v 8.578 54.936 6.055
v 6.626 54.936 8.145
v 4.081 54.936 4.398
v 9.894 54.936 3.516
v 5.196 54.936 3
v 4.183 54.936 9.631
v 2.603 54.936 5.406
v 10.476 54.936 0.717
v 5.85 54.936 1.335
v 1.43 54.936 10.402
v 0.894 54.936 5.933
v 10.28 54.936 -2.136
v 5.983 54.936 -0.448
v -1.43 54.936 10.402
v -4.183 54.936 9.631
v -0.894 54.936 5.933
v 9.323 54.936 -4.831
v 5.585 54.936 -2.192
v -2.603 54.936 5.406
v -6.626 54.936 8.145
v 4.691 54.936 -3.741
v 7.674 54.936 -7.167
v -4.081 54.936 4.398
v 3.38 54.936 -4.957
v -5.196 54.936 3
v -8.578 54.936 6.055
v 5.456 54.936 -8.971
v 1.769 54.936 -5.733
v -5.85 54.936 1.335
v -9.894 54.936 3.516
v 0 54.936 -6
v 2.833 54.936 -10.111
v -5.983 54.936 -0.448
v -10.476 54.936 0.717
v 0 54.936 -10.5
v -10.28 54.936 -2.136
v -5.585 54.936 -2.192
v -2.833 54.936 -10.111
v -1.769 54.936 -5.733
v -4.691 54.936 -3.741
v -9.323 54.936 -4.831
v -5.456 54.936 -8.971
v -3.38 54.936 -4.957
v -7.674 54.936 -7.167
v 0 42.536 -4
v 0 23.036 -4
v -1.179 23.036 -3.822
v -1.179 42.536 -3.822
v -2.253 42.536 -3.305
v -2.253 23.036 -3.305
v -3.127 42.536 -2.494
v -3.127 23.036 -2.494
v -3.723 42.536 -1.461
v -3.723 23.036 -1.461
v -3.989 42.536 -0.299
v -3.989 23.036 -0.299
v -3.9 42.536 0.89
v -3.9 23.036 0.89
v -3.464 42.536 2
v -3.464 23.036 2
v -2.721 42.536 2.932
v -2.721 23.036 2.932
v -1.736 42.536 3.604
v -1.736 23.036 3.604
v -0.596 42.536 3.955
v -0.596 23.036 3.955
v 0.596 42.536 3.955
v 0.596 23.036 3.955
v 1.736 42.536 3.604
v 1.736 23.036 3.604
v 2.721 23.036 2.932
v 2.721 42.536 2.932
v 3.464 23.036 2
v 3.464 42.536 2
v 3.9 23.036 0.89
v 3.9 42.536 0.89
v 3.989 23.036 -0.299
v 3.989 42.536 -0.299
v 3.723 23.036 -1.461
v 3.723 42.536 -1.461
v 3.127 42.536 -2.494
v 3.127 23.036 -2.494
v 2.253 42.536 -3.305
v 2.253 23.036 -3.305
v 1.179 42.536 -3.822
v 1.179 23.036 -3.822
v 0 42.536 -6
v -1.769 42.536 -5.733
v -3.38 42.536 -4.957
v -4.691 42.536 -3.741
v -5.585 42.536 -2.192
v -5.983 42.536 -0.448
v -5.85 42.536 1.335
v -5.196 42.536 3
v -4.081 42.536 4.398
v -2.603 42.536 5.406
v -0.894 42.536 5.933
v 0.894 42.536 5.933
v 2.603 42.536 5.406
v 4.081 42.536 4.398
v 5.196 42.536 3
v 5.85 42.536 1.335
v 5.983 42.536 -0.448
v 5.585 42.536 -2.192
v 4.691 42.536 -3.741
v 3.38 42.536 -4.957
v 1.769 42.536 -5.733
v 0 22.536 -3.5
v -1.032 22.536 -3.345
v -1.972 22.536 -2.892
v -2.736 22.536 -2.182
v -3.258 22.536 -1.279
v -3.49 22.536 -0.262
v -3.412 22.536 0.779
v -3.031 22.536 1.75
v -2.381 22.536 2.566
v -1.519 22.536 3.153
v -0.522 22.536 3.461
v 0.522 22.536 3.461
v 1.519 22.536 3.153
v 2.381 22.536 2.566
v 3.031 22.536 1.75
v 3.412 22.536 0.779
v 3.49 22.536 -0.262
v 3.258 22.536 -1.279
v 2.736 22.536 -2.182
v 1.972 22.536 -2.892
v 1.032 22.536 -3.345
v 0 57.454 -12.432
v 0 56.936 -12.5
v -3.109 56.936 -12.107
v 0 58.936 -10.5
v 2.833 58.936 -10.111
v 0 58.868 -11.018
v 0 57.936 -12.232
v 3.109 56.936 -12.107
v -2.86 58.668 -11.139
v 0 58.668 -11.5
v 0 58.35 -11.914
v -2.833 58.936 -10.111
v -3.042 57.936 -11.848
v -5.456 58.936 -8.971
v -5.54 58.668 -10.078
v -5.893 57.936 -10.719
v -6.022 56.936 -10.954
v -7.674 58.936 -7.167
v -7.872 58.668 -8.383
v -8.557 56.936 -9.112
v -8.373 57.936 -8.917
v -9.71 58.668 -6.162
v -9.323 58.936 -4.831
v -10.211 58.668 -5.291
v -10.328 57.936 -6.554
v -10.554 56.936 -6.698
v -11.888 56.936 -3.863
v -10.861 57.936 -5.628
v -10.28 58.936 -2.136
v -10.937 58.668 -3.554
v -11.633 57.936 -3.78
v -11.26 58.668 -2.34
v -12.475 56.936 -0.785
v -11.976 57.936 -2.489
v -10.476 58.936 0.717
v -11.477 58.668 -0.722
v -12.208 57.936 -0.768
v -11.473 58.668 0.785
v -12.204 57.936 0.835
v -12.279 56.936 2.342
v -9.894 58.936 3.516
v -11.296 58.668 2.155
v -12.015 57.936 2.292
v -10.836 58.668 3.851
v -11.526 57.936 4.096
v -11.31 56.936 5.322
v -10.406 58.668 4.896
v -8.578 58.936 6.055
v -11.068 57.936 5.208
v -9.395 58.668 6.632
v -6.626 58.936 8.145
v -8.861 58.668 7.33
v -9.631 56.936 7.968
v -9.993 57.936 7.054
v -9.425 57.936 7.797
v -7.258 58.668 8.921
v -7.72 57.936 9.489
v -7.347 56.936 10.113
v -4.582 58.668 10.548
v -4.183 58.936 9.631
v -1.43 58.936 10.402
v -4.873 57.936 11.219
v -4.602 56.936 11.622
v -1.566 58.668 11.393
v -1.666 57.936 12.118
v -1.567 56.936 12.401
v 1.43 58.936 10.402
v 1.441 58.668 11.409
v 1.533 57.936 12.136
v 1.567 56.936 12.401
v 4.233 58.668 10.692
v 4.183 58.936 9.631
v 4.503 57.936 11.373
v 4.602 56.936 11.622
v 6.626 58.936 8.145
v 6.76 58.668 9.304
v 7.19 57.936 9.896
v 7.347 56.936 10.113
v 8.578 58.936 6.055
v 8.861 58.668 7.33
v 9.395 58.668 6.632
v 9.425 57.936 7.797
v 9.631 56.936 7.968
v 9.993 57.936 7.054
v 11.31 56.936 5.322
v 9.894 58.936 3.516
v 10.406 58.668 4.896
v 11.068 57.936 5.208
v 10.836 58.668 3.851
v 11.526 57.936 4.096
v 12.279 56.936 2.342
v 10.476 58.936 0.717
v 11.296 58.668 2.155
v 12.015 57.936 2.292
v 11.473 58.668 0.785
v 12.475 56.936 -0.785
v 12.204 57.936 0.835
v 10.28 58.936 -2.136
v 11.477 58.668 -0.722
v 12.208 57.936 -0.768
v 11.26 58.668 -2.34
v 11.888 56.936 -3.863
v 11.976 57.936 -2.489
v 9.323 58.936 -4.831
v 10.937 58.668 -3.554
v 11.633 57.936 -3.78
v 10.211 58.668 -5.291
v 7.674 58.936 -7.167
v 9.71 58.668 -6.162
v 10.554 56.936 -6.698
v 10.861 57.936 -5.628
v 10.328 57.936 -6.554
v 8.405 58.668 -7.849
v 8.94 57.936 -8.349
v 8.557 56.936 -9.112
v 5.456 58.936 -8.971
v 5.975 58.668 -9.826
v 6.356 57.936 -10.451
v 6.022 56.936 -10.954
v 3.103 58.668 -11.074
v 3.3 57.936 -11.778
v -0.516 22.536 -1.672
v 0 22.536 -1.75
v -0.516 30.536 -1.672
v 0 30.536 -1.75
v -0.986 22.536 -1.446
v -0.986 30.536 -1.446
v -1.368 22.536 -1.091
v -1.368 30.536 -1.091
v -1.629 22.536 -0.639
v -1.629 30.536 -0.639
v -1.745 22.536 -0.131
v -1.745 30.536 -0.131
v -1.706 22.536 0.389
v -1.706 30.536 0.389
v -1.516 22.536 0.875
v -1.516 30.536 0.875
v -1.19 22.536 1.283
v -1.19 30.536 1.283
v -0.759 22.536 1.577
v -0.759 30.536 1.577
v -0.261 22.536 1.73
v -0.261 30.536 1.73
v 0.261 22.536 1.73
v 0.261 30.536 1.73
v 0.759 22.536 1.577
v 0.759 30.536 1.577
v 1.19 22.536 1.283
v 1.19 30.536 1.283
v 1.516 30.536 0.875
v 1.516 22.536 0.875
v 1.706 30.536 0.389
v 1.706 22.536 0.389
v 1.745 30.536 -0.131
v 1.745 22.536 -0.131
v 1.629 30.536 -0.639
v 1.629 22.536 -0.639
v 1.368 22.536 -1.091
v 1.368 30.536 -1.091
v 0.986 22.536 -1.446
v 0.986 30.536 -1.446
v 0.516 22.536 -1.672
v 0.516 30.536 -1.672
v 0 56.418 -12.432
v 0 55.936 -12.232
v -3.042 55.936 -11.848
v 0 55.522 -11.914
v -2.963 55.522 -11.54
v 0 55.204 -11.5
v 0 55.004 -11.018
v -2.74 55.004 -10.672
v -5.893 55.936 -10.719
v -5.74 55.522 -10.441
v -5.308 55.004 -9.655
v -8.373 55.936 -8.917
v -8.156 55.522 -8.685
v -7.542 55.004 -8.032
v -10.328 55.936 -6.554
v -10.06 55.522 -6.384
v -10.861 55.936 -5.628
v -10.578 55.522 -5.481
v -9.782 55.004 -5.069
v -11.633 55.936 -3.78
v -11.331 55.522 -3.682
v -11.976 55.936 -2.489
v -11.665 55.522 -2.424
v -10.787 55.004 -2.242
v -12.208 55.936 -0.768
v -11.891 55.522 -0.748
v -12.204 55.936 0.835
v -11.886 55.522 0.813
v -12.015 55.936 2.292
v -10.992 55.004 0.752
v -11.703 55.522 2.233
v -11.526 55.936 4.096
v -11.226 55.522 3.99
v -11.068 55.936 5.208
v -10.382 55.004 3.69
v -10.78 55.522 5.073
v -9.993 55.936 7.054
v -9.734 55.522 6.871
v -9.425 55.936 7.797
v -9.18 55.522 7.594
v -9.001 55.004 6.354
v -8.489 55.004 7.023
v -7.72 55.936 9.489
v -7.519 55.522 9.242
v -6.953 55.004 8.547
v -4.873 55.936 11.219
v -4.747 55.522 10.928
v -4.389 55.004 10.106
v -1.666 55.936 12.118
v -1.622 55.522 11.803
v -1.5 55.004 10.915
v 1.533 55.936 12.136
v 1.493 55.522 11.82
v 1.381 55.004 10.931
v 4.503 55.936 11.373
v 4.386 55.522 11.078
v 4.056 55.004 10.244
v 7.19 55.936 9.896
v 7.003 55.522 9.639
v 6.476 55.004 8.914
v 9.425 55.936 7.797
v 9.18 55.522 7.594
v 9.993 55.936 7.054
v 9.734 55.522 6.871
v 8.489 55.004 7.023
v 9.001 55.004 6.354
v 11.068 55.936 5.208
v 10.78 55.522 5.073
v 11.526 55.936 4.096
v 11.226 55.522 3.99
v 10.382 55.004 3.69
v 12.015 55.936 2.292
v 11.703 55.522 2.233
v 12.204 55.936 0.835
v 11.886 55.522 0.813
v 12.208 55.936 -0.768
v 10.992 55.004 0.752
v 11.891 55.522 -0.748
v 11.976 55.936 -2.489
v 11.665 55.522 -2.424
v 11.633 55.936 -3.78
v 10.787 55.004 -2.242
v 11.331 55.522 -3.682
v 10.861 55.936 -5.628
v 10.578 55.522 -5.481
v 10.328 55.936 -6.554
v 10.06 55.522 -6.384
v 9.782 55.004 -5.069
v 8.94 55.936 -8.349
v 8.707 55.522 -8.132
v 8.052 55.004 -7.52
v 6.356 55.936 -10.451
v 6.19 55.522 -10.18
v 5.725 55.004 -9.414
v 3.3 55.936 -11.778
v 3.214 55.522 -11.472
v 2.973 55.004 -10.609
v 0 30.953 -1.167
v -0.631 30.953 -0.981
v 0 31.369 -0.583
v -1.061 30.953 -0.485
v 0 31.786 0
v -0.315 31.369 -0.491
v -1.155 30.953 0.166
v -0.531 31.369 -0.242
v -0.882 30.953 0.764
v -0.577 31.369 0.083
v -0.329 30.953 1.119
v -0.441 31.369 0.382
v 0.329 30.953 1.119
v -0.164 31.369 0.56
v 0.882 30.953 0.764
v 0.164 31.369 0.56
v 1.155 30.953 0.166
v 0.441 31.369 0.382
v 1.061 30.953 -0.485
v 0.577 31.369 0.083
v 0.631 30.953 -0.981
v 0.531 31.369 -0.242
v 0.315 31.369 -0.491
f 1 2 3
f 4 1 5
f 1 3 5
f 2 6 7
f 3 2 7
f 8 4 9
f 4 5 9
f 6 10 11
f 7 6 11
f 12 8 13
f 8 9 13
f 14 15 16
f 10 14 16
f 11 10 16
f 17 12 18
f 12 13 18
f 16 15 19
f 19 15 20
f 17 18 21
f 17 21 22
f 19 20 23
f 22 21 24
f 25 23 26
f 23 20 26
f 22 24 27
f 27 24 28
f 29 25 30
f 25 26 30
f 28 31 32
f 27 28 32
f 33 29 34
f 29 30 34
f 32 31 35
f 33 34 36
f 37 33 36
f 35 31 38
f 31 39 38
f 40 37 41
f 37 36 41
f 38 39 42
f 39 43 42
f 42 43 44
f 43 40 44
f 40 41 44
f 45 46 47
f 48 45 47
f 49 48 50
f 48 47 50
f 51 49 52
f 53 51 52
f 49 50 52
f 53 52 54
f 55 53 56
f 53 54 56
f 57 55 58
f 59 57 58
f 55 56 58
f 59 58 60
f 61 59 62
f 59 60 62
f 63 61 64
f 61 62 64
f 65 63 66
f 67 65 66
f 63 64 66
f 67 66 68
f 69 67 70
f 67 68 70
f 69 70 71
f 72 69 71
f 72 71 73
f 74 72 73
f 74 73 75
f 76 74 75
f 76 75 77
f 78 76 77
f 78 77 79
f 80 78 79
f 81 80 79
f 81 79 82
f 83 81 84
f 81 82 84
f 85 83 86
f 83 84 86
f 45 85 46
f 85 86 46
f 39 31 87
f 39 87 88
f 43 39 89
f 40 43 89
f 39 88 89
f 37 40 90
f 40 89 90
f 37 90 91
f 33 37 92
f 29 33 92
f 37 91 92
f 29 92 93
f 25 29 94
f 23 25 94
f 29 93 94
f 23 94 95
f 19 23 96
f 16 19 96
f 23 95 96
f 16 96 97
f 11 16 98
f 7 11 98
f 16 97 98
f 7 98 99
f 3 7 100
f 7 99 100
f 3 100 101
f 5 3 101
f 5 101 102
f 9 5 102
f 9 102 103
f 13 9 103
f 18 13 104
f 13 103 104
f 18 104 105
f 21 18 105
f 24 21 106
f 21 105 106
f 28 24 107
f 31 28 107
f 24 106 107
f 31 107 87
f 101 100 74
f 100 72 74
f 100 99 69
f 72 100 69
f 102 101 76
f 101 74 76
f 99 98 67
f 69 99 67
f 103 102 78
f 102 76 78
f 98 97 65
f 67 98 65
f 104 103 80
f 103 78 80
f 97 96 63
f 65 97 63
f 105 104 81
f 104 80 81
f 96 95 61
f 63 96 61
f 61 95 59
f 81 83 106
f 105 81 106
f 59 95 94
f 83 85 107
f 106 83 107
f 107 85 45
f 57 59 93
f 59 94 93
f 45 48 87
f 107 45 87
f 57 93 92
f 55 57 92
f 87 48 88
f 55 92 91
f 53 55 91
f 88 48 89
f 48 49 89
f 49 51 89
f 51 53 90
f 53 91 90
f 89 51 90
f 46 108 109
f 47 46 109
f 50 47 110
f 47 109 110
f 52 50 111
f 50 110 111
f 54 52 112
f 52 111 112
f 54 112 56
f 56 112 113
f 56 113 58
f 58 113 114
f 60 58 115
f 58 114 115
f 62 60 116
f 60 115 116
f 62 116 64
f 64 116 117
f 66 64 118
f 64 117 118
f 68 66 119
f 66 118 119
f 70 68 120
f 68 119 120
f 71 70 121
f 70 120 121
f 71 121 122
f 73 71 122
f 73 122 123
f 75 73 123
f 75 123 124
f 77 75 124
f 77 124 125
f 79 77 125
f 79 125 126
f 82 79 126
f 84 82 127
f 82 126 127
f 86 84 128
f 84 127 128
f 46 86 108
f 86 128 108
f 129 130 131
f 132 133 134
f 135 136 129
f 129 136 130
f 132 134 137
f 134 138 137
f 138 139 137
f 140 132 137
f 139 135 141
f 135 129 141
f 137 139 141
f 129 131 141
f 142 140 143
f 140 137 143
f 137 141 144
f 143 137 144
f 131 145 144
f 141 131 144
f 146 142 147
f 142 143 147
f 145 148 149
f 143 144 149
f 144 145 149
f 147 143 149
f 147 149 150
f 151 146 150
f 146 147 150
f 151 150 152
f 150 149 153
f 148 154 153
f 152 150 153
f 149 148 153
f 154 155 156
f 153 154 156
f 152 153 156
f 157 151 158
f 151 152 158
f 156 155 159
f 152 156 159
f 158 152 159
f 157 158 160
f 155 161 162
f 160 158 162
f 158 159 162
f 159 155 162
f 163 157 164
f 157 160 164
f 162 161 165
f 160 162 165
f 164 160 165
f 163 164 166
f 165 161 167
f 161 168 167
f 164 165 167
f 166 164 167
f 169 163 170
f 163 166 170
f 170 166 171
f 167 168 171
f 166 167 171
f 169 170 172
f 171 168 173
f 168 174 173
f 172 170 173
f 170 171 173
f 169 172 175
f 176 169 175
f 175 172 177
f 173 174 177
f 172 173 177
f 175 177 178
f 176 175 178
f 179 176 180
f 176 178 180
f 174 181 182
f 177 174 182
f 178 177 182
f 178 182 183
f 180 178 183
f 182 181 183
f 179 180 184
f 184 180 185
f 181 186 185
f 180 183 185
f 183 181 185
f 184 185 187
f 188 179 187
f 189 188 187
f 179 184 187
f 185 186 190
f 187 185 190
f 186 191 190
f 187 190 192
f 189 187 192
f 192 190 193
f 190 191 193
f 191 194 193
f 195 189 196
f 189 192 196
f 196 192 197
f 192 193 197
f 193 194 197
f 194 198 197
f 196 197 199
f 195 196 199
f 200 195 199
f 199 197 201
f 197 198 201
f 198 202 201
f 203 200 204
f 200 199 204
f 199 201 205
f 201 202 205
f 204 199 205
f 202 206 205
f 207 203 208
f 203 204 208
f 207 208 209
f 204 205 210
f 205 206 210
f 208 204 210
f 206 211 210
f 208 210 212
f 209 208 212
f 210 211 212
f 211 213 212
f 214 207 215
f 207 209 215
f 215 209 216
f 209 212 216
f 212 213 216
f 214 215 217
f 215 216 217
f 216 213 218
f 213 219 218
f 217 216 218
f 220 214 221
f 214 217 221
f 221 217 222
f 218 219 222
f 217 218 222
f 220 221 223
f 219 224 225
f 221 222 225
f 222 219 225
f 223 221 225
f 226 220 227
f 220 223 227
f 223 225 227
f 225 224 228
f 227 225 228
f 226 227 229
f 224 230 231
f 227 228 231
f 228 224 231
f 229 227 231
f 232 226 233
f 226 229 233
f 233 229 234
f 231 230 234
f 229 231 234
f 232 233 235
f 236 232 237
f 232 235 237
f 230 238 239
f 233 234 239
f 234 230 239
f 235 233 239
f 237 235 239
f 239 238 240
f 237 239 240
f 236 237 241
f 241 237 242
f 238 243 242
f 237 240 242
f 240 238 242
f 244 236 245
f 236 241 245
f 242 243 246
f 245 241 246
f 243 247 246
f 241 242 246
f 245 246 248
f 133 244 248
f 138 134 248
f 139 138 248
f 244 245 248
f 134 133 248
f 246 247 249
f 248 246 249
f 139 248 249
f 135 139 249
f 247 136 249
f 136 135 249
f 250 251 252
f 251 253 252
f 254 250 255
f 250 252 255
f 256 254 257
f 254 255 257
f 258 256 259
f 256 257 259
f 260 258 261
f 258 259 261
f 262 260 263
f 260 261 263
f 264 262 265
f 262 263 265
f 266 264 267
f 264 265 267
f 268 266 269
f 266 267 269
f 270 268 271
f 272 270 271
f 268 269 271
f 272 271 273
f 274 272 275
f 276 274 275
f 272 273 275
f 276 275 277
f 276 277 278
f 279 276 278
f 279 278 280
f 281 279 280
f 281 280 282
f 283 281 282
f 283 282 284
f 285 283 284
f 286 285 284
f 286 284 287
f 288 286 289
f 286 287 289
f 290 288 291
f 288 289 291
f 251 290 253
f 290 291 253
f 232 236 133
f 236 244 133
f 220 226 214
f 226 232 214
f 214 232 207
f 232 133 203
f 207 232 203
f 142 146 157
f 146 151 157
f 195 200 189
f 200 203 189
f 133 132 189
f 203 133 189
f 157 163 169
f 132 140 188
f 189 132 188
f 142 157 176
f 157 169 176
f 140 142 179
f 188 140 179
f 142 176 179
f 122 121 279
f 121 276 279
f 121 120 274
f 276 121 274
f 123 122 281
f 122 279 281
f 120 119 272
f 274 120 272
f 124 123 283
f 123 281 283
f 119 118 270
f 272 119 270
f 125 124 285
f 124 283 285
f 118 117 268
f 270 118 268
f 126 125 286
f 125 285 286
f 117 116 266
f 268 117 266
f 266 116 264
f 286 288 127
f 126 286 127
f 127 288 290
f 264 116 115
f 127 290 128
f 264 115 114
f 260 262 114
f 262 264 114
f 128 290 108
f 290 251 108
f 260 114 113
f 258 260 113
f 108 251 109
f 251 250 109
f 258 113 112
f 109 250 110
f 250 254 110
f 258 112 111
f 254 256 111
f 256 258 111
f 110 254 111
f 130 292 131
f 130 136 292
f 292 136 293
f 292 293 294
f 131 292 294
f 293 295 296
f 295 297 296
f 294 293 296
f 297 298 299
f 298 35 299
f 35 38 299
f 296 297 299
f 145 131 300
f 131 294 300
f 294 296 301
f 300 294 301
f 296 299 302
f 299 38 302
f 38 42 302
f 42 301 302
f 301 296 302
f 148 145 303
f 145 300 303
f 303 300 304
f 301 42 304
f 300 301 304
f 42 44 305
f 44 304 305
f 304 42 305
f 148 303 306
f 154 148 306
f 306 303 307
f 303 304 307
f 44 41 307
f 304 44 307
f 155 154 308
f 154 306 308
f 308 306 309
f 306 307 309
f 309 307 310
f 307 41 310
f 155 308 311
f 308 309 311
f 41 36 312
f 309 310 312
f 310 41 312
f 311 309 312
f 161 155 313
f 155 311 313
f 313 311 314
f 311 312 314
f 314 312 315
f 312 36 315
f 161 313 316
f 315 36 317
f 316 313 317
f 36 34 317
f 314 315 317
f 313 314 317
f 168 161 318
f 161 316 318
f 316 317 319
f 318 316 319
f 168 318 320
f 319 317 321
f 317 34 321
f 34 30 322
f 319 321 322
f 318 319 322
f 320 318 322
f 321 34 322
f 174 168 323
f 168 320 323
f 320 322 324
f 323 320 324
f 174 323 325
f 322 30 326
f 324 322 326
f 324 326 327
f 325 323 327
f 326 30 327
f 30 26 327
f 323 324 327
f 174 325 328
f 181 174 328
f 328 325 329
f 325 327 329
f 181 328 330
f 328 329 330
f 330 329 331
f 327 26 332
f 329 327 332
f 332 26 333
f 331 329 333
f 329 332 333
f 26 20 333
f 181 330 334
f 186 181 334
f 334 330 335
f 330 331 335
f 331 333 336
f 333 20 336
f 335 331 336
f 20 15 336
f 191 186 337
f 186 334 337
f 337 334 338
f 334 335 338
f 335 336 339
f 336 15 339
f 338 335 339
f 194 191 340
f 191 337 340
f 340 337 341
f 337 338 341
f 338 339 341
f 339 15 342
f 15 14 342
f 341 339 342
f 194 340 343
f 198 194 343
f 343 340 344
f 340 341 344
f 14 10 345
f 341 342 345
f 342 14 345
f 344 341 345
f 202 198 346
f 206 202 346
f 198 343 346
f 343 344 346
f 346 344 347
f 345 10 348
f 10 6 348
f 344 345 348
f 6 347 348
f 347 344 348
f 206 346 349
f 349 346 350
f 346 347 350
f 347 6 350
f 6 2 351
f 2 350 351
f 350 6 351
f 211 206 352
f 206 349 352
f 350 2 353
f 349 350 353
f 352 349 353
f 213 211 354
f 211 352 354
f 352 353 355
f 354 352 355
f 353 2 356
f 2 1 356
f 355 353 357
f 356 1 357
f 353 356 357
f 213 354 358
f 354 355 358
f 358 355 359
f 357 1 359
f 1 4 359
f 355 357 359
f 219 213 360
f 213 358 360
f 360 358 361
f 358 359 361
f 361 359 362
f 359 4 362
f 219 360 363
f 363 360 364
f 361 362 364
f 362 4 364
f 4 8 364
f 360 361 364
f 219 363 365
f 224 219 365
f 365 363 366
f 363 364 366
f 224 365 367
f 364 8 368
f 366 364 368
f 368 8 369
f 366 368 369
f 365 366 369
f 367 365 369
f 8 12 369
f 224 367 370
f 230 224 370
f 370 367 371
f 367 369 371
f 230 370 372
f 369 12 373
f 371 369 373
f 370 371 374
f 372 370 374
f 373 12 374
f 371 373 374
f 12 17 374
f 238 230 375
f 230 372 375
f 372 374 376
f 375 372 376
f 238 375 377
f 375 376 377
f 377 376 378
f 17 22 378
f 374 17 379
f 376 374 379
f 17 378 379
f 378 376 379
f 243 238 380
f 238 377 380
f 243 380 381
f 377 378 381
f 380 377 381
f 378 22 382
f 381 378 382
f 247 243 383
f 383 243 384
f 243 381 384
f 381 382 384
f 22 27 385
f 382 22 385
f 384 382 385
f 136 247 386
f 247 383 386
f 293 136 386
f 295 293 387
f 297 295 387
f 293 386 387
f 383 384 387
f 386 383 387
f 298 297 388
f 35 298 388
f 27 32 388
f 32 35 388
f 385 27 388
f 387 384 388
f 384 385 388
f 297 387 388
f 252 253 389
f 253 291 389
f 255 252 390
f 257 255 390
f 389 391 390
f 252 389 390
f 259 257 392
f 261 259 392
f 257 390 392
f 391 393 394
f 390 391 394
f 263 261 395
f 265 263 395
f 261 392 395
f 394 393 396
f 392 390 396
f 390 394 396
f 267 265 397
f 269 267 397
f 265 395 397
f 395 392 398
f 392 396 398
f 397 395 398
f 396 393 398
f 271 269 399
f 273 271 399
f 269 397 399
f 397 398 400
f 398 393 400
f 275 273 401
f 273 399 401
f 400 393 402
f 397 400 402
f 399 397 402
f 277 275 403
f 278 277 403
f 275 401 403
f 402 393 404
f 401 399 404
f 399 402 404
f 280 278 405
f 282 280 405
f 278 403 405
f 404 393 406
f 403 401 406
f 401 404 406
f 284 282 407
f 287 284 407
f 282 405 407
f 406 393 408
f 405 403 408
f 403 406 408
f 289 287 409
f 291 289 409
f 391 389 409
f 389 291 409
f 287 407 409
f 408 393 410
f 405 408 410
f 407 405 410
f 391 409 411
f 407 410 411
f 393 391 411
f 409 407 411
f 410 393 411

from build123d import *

# Parameters (mm, degrees)
FILETE1_R     = 2
CHANFRO1_SIZE = 0.5


with BuildPart() as part:
    # Esboço1 → Revolução1 (revolve)
    with BuildSketch(Plane.XY, mode=Mode.PRIVATE) as revolu_o1_sk:
        Polygon((0, 58.936157254), (12.5, 58.936157254), (12.5, 54.936157254), (6, 54.936157254), (6, 42.536157254), (4, 42.536157254), (4, 22.536157254), (1.75, 22.536157254), (1.75, 30.536157254), (0, 31.786157254), align=None)
    revolve(revolu_o1_sk.sketch.rotate(Axis((0, -51.524307863, 0), (0, 1, 0)), 90), axis=Axis((0, -51.524307863, 0), (0, 1, 0)))

    # Filete1
    filete1_edges = [part.edges().sort_by_distance(p)[0] for p in [
        (0, 54.936157254, 12.5),
        (0, 58.936157254, 12.5),
    ]]
    fillet(filete1_edges, radius=FILETE1_R - 0.0001)  # a hair under: the kernel refuses the full size

    # Chanfro1
    chanfro1_edges = [part.edges().sort_by_distance(p)[0] for p in [
        (0, 22.536157254, 4),
    ]]
    chamfer(chanfro1_edges, length=CHANFRO1_SIZE)


solid = part.part
